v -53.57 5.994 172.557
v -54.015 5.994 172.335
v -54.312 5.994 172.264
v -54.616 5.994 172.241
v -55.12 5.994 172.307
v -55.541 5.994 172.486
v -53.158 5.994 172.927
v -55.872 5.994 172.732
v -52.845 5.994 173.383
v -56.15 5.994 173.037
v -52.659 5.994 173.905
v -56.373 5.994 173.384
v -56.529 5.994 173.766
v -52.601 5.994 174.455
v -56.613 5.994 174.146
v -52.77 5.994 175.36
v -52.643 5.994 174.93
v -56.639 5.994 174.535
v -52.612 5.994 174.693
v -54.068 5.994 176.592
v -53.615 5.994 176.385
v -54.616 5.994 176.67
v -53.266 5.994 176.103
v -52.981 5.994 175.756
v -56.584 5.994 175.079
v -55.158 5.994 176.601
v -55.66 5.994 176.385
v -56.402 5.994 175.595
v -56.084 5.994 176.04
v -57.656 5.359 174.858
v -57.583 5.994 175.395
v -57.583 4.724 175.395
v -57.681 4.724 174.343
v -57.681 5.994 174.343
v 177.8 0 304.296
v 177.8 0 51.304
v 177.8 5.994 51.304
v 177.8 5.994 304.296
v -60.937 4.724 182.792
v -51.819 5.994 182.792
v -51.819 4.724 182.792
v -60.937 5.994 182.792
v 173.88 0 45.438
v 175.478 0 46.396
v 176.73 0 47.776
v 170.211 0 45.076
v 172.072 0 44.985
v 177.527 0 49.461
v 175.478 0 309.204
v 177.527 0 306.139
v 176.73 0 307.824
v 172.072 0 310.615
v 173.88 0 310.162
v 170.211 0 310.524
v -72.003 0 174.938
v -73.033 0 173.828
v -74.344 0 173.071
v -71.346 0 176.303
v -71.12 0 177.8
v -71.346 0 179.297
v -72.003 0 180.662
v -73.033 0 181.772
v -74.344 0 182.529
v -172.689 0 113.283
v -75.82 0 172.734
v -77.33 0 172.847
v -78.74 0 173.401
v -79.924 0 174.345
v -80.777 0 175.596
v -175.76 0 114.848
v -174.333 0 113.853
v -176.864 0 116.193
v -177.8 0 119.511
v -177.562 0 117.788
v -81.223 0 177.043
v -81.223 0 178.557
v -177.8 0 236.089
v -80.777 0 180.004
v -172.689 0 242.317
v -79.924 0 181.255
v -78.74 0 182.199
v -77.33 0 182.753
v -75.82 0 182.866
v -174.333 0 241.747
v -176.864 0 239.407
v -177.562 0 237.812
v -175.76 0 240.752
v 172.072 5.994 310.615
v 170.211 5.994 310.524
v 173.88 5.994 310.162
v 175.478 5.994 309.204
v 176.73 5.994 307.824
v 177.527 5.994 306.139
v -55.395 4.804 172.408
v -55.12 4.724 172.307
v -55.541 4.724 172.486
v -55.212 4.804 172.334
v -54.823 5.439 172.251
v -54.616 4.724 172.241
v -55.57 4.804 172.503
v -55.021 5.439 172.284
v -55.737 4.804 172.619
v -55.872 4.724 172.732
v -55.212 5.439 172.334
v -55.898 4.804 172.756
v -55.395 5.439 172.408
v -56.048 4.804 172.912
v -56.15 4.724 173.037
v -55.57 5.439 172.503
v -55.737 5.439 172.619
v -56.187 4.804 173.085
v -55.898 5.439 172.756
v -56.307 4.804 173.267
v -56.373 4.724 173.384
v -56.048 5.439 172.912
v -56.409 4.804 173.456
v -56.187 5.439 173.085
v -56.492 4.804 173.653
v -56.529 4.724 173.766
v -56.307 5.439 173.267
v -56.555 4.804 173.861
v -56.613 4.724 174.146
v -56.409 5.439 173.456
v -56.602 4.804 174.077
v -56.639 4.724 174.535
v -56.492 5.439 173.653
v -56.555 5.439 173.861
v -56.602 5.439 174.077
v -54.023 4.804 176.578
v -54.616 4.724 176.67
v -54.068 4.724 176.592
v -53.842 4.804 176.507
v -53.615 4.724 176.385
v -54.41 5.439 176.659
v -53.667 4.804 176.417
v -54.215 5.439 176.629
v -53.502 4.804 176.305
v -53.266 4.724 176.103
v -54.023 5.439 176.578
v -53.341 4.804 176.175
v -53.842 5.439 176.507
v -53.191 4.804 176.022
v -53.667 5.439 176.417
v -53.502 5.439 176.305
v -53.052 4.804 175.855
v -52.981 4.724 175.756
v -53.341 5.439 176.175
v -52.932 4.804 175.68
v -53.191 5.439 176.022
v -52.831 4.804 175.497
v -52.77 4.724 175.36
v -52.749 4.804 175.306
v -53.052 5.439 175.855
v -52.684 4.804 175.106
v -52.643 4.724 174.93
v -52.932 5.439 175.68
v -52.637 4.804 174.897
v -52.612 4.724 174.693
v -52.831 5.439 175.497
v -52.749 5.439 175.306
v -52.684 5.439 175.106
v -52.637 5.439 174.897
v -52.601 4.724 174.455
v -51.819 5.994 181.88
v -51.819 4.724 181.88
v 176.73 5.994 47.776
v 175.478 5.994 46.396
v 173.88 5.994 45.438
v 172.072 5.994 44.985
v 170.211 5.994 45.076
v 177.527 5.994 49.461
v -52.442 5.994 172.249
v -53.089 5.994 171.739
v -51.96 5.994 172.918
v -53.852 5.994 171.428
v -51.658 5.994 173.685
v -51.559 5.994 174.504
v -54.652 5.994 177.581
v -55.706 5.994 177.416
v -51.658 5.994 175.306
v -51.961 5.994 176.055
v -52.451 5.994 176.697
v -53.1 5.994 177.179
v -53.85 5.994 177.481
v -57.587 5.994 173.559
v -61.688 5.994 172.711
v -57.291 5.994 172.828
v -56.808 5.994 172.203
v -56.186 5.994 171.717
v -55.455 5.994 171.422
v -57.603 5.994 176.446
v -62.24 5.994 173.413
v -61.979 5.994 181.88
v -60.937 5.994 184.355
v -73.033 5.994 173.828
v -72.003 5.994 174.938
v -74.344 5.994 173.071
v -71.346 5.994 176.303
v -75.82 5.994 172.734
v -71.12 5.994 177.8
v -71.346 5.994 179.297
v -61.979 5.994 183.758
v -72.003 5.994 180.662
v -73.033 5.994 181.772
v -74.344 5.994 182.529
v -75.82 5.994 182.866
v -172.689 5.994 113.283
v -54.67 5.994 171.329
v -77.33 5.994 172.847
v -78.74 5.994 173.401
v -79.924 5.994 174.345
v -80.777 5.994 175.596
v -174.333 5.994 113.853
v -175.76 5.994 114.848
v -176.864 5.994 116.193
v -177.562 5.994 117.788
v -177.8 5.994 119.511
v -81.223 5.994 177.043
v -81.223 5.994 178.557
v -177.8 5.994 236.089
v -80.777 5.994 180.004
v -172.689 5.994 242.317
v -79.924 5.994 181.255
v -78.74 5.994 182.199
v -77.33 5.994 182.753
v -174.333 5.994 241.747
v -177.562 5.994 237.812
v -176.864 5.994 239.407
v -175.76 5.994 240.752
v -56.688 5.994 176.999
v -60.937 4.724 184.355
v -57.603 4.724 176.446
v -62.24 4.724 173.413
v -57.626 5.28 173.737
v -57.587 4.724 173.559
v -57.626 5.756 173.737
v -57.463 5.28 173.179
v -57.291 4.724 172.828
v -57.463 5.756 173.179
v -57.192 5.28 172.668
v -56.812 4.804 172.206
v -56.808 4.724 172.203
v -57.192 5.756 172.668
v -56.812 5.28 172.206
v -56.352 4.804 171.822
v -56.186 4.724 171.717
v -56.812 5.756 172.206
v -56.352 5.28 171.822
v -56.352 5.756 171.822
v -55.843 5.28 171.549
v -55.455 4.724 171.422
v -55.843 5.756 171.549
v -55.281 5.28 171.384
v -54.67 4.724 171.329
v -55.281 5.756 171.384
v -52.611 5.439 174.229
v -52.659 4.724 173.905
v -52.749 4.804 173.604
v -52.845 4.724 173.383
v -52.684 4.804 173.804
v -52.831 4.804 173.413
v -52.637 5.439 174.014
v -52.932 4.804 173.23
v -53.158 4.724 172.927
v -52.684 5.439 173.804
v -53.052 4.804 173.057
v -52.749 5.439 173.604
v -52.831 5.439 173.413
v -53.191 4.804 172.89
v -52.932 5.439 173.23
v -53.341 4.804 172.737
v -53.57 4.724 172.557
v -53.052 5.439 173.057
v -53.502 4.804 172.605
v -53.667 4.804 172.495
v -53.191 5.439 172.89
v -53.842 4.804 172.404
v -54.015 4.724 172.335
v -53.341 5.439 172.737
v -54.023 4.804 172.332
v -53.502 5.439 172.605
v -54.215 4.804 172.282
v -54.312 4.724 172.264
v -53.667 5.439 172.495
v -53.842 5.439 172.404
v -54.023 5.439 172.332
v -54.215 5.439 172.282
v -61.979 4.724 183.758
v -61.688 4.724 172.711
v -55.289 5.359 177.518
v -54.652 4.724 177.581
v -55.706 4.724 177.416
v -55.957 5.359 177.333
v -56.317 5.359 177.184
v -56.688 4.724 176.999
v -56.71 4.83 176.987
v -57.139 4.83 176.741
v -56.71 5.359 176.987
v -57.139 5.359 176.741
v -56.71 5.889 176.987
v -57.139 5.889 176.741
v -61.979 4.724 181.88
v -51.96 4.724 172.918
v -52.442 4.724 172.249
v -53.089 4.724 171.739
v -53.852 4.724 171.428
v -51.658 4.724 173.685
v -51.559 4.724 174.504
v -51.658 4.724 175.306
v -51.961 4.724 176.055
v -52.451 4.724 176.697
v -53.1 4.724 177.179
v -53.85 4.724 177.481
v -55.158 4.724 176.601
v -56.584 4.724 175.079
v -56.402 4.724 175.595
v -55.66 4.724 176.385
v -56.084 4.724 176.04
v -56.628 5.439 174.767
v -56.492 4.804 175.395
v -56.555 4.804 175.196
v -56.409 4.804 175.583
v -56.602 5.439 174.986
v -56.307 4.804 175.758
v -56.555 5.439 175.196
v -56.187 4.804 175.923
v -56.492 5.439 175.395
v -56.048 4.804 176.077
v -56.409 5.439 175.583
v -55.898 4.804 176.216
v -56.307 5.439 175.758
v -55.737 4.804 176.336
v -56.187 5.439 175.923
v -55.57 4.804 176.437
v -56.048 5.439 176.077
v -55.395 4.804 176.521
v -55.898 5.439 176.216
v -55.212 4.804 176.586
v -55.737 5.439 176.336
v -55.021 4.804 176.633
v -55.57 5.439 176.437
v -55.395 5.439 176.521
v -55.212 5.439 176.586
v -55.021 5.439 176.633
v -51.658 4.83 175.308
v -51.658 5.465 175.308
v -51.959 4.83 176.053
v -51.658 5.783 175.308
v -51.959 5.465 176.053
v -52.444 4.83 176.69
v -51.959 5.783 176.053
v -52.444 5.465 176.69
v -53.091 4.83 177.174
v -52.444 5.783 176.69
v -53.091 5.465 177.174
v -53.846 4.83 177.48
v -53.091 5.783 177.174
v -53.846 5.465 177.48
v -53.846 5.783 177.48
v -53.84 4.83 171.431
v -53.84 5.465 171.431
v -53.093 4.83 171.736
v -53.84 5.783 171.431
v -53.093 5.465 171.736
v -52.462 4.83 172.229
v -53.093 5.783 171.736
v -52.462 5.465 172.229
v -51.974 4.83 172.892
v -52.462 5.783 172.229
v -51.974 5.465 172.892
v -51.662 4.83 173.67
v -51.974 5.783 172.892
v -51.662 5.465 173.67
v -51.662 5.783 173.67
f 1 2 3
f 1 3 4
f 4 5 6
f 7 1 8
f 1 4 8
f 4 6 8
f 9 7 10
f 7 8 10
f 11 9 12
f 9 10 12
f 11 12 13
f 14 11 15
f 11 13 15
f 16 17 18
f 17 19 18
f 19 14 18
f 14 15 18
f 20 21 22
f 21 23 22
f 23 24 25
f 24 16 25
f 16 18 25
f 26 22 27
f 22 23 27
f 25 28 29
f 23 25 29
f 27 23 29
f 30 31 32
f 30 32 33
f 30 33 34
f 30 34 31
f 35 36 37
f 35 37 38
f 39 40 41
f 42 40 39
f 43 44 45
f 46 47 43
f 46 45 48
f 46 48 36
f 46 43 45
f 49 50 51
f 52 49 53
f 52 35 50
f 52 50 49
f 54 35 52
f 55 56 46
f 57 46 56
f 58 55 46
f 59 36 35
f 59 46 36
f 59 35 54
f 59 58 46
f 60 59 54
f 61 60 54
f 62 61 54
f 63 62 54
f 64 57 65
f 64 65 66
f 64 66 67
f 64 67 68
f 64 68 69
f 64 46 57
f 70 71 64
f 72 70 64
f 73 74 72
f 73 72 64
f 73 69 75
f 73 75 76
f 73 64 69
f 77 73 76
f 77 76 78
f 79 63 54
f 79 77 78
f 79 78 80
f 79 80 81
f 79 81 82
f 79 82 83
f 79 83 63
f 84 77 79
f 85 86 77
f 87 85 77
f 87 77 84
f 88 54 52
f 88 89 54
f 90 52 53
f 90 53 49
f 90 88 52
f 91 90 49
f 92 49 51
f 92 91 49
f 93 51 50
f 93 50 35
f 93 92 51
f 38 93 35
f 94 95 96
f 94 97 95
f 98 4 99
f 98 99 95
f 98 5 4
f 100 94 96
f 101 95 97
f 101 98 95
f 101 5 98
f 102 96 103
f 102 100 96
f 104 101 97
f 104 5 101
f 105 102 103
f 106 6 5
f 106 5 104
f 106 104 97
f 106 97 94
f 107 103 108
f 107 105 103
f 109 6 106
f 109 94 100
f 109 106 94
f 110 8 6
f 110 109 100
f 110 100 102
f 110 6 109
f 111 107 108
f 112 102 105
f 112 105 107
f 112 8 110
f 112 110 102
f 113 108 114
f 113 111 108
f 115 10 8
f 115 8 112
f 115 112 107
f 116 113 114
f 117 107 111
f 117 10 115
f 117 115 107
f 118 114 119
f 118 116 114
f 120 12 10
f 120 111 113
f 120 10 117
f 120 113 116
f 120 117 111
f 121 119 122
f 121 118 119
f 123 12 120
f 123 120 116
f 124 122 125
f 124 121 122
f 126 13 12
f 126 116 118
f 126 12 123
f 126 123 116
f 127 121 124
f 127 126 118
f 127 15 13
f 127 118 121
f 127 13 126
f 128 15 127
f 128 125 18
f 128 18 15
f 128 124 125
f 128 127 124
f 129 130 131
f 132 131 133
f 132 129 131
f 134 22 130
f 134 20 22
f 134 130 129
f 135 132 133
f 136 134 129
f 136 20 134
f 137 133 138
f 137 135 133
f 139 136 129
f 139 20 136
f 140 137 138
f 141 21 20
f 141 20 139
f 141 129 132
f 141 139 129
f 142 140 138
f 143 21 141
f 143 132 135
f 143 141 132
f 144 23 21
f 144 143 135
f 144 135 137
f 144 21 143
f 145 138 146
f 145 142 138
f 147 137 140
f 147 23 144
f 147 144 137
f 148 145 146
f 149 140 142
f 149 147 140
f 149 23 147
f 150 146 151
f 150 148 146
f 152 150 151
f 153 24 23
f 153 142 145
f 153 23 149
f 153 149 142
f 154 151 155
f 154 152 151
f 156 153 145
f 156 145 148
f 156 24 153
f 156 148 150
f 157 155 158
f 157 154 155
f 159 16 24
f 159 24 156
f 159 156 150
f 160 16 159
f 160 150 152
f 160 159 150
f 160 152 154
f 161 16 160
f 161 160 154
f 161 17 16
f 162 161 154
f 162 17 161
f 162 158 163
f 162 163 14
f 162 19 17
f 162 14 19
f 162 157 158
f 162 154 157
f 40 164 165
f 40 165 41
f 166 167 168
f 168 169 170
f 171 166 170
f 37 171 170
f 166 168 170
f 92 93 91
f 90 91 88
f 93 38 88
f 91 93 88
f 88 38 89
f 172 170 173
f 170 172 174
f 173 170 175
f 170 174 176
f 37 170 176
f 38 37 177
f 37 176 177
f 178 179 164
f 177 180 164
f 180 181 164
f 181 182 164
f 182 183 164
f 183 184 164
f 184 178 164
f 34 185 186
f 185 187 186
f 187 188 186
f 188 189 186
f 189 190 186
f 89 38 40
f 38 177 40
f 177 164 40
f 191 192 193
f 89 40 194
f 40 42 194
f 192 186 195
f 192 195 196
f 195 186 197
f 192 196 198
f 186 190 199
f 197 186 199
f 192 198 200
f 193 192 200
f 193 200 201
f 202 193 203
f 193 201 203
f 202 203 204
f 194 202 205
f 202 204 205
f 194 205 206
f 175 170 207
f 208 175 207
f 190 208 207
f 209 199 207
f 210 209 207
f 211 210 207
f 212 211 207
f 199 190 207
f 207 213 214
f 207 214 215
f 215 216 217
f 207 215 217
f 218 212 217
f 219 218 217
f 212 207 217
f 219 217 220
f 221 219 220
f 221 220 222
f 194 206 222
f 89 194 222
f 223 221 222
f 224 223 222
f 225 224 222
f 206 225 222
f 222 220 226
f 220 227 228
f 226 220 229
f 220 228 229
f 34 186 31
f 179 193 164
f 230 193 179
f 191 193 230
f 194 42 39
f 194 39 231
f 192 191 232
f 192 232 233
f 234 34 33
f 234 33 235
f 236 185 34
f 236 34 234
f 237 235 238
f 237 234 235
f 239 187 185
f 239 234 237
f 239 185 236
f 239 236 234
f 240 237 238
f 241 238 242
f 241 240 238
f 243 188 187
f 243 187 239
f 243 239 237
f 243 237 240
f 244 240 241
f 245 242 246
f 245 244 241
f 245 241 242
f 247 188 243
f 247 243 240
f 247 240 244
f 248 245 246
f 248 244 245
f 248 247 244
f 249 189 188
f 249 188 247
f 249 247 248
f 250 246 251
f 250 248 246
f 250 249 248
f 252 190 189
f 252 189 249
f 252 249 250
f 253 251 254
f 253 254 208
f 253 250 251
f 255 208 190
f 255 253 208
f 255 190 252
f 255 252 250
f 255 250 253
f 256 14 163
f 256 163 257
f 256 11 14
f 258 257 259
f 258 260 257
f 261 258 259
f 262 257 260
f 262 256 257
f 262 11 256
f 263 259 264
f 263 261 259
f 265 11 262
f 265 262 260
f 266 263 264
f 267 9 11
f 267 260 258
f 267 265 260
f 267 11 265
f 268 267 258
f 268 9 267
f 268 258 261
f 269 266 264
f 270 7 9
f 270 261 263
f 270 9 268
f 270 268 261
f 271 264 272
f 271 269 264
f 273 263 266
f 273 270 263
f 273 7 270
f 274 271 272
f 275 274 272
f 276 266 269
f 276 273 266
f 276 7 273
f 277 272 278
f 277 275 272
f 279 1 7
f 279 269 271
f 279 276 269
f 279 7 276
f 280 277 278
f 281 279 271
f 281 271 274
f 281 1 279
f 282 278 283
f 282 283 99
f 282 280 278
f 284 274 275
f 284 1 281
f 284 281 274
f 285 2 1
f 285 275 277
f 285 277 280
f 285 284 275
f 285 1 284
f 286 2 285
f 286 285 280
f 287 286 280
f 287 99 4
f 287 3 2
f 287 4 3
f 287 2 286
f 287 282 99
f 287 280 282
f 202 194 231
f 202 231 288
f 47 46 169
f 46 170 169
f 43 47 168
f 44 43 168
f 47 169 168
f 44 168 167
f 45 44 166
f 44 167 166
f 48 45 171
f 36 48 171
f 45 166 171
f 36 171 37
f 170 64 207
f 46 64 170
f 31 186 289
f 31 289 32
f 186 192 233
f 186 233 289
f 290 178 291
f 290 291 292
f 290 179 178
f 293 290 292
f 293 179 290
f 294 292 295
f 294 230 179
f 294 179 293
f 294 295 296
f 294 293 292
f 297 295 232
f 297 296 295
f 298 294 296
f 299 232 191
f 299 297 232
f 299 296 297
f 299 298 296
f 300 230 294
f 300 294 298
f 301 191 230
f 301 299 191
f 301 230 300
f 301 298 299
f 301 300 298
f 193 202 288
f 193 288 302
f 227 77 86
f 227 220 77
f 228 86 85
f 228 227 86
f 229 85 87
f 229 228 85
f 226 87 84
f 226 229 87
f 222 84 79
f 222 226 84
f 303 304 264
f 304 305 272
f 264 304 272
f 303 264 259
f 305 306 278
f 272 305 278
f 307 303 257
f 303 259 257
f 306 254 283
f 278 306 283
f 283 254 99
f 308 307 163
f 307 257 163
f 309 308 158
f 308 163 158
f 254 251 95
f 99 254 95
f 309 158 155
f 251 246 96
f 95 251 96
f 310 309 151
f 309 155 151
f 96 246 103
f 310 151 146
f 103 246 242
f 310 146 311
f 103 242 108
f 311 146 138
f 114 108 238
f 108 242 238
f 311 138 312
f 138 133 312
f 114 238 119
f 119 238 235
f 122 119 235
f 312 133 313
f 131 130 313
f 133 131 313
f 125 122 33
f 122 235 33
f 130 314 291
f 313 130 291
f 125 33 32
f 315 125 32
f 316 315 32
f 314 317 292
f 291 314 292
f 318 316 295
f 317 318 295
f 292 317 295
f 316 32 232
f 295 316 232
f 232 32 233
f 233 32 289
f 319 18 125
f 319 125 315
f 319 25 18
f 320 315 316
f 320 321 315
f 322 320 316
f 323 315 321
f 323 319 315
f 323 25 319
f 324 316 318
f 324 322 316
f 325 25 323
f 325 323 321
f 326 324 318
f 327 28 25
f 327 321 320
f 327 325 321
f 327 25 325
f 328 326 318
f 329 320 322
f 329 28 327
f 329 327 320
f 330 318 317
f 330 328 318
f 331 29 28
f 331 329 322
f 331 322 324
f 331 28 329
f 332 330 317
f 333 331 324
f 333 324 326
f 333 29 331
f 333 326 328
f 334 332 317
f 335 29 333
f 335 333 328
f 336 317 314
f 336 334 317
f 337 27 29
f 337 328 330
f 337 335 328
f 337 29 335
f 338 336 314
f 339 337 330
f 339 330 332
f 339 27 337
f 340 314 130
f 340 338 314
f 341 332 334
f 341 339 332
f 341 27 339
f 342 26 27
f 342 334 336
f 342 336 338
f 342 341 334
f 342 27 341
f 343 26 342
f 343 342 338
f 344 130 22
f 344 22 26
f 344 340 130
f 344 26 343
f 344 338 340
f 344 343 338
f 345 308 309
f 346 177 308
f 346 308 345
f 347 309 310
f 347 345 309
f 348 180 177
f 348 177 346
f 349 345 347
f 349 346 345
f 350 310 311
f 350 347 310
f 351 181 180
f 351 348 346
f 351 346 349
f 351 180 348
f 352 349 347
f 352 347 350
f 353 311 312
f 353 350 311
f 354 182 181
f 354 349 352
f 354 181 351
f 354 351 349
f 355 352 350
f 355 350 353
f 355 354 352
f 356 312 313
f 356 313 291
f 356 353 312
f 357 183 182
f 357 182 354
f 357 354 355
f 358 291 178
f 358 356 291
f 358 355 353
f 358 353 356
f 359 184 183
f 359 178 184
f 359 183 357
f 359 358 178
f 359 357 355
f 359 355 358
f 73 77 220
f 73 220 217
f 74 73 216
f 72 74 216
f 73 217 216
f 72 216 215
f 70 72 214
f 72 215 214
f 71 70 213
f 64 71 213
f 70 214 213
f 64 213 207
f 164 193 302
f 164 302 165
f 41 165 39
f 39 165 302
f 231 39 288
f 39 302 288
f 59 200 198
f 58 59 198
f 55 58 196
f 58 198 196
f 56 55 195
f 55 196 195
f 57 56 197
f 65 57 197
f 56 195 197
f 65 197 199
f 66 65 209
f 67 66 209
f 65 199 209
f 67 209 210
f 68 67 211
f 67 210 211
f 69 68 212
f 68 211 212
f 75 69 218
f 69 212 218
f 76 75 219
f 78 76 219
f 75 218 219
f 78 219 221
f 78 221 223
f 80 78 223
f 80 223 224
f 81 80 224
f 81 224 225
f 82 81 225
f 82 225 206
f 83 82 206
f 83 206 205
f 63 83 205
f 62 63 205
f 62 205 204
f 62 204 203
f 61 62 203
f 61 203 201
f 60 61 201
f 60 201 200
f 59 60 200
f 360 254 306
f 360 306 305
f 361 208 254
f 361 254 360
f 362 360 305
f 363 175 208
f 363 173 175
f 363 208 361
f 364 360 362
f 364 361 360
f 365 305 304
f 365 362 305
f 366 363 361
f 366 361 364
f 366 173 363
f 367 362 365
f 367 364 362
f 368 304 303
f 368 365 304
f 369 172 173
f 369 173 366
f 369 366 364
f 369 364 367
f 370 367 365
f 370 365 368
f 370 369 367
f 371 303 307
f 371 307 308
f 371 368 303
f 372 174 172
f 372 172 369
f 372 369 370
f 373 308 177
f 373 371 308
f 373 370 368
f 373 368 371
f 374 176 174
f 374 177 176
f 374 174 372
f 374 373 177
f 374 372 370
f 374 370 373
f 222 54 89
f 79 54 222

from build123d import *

# Parameters (mm, degrees)
BOSS_EXTRUDE1_DEPTH   = 5.9944
SKETCH2_R             = 5.08
CUT_EXTRUDE1_DEPTH    = 381.139257342
CUT_EXTRUDE2_DEPTH    = 1.27
FILLET1_R             = 6.35
BODY_MOVE_COPY1_ANGLE = 90


with BuildPart() as part:
    # Sketch1 → Boss-Extrude1 (new body)
    with BuildSketch(Plane(origin=(0, 0, 0), x_dir=(1, 0, 0), z_dir=(0, 1, 0))):
        Polygon((-63.5, 0), (63.5, 0), (134.23323784, -355.6), (-134.23323784, -355.6), align=None)
    extrude(amount=BOSS_EXTRUDE1_DEPTH)

    # Sketch2 → Cut-Extrude1 (cut, through all)
    with BuildSketch(Plane(origin=(0, 5.9944, 0), x_dir=(1, 0, 0), z_dir=(0, 1, 0))):
        with Locations(Location((0, -101.6, 0), (0, 0, 270))):
            Circle(SKETCH2_R)
    extrude(amount=-CUT_EXTRUDE1_DEPTH, mode=Mode.SUBTRACT)

    # Sketch3 → Cut-Extrude2 (cut)
    # profile 1 of 2: a face of its own
    with BuildSketch(Plane(origin=(0, 5.9944, 0), x_dir=(1, 0, 0), z_dir=(0, 1, 0))):
        Polygon((-5.958315024, -115.820937251), (-4.079773357, -115.820937251), (-4.079773357, -125.980937251), (-4.991568229, -125.980937251), (-4.991568229, -116.862988533), (-6.554645152, -116.862988533), align=None)
    # profile 2 of 2: a face of its own
    with BuildSketch(Plane(origin=(0, 5.9944, 0), x_dir=(1, 0, 0), z_dir=(0, 1, 0))):
        with BuildLine():
            Line((4.386893309, -115.56042443), (5.089056771, -116.111978917))
            Line((5.089056771, -116.111978917), (2.404553566, -120.217091097))
            add(Edge.make_bspline(
                [(2.404553566, -120.217091097), (2.583283284, -120.188602861), (2.931915808, -120.133033337), (3.284804245, -120.123866273), (3.45678113, -120.119398789)],
                knots=[0, 0, 0, 0, 1.025318673, 2, 2, 2, 2], degree=3))
            add(Edge.make_bspline(
                [(3.45678113, -120.119398789), (3.560043005, -120.122174245), (3.763310933, -120.127637647), (4.061744393, -120.169682196), (4.348514562, -120.235940235), (4.622432842, -120.332524841), (4.884482412, -120.455903104), (5.136167082, -120.603771368), (5.372755774, -120.783765), (5.597295197, -120.984831271), (5.801154428, -121.207529718), (5.981642635, -121.44382617), (6.133249551, -121.693474441), (6.256254992, -121.956348086), (6.351773154, -122.232041891), (6.42140586, -122.520203119), (6.462567193, -122.821030476), (6.468156617, -123.025618551), (6.470995873, -123.12954302)],
                knots=[0, 0, 0, 0, 1.04369286, 2.054478336, 3.041073146, 4.015093852, 4.984733326, 5.965804835, 6.960378782, 7.985147595, 9.009457201, 10.008161701, 10.986880575, 11.956520048, 12.937015923, 13.931873656, 14.949455224, 16, 16, 16, 16], degree=3))
            add(Edge.make_bspline(
                [(6.470995873, -123.12954302), (6.466864803, -123.271724103), (6.458735835, -123.551502827), (6.377735101, -123.958996352), (6.251868247, -124.34720274), (6.071956336, -124.709923946), (5.848487475, -125.046662834), (5.575974235, -125.345034357), (5.264081137, -125.611139379), (4.911422318, -125.833662594), (4.53189417, -126.015390308), (4.133180944, -126.145917982), (3.719154713, -126.226279139), (3.438144765, -126.236353802), (3.295995873, -126.241450071)],
                knots=[0, 0, 0, 0, 1.031375318, 2.029502543, 3.004789286, 3.987476834, 4.960371455, 5.9300674, 6.912260825, 7.929083631, 8.949397511, 9.960523116, 10.96833055, 12, 12, 12, 12], degree=3))
            add(Edge.make_bspline(
                [(3.295995873, -126.241450071), (3.15928088, -126.237013908), (2.888472414, -126.228226646), (2.490105217, -126.149948381), (2.107325715, -126.023072905), (1.742815741, -125.848279457), (1.405153618, -125.627494288), (1.103065942, -125.361702072), (0.838058963, -125.056584311), (0.617515491, -124.712188331), (0.442593001, -124.342103197), (0.311413104, -123.956205623), (0.234788581, -123.555901676), (0.224081227, -123.284539284), (0.218688181, -123.147860328)],
                knots=[0, 0, 0, 0, 1.012016664, 2.004627821, 2.994792927, 3.992885782, 4.990978636, 5.973936114, 6.964471063, 7.975201453, 8.993600317, 9.990122807, 10.98767138, 12, 12, 12, 12], degree=3))
            add(Edge.make_bspline(
                [(0.218688181, -123.147860328), (0.222117747, -123.043228052), (0.229120266, -122.829588936), (0.278014222, -122.506024787), (0.356579455, -122.174950789), (0.44456577, -121.894087187), (0.537531541, -121.664002312), (0.614900056, -121.478499608), (0.711199427, -121.287604607), (0.813883299, -121.084771424), (0.932194667, -120.875227425), (1.060836667, -120.655470487), (1.203365939, -120.428995588), (1.303282754, -120.275306153), (1.354361258, -120.196738533)],
                knots=[0, 0, 0, 0, 1.173818275, 2.396712641, 3.66331629, 4.989737886, 5.693666774, 6.447286557, 7.243889047, 8.091586357, 8.998013824, 9.943181721, 10.948533338, 12, 12, 12, 12], degree=3))
            Line((1.354361258, -120.196738533), (4.386893309, -115.56042443))
        make_face()
        with BuildLine():
            add(Edge.make_bspline(
                [(3.265467027, -121.161450071), (3.188070339, -121.163708621), (3.036892125, -121.168120225), (2.815092315, -121.19373867), (2.605177277, -121.241981443), (2.40436594, -121.303424281), (2.216412608, -121.387906306), (2.03995129, -121.490527528), (1.874299597, -121.611347862), (1.721192601, -121.74865565), (1.58237895, -121.898988912), (1.46283601, -122.06000901), (1.359719557, -122.227835383), (1.275879763, -122.403870278), (1.210594286, -122.588046402), (1.163369878, -122.77951668), (1.137088131, -122.979565066), (1.132715756, -123.115222846), (1.130483053, -123.184494943)],
                knots=[0, 0, 0, 0, 1.129588631, 2.206414736, 3.251139165, 4.268635594, 5.265702196, 6.250456724, 7.242448911, 8.251968645, 9.246821453, 10.222880186, 11.173611482, 12.116736599, 13.062300278, 14.020270554, 14.989073742, 16, 16, 16, 16], degree=3))
            add(Edge.make_bspline(
                [(1.130483053, -123.184494943), (1.132301291, -123.253147456), (1.135866585, -123.387764814), (1.168240176, -123.586143689), (1.217690586, -123.777049823), (1.291250136, -123.959499036), (1.378994474, -124.136272348), (1.494833929, -124.300966776), (1.623188942, -124.463585037), (1.77661636, -124.611635023), (1.941276179, -124.749394823), (2.117192813, -124.869806073), (2.300537154, -124.972817365), (2.493784482, -125.053549009), (2.694193048, -125.119804653), (2.903432599, -125.166428832), (3.121648659, -125.192788302), (3.269467771, -125.197166373), (3.344842027, -125.199398789)],
                knots=[0, 0, 0, 0, 0.989467248, 1.94019797, 2.891935182, 3.827694429, 4.772920941, 5.730924762, 6.725747692, 7.756678648, 8.79901574, 9.819492441, 10.826891316, 11.826466727, 12.835195252, 13.867842842, 14.912794438, 16, 16, 16, 16], degree=3))
            add(Edge.make_bspline(
                [(3.344842027, -125.199398789), (3.42021616, -125.197166198), (3.568035029, -125.192787784), (3.786252845, -125.166430802), (3.995485908, -125.119797424), (4.195918058, -125.053575211), (4.389078327, -124.972720162), (4.572262318, -124.870446932), (4.746515298, -124.748654316), (4.91128321, -124.611870444), (5.064072014, -124.462742394), (5.195505486, -124.3024184), (5.307797386, -124.134941263), (5.399046341, -123.960195389), (5.471795689, -123.776939505), (5.521496863, -123.586173243), (5.553803599, -123.387757076), (5.557378079, -123.253144843), (5.559201002, -123.184494943)],
                knots=[0, 0, 0, 0, 1.087397944, 2.132534446, 3.165364764, 4.174271784, 5.174024072, 6.181601208, 7.194203697, 8.236725232, 9.267838612, 10.269026844, 11.221737037, 12.171628256, 13.107553087, 14.05945871, 15.010357665, 16, 16, 16, 16], degree=3))
            add(Edge.make_bspline(
                [(5.559201002, -123.184494943), (5.55760358, -123.115132475), (5.55446836, -122.978996509), (5.519007206, -122.779606166), (5.469825915, -122.587073567), (5.395562032, -122.402608755), (5.299081091, -122.226939663), (5.181563543, -122.059178902), (5.045615282, -121.898040294), (4.888577853, -121.748360827), (4.717627917, -121.611499595), (4.535863817, -121.490683969), (4.345703528, -121.388721179), (4.147339855, -121.303646848), (3.938499944, -121.242252946), (3.722555417, -121.19391096), (3.496744358, -121.168185789), (3.343541404, -121.163723908), (3.265467027, -121.161450071)],
                knots=[0, 0, 0, 0, 0.978206639, 1.919901502, 2.851605144, 3.780102724, 4.718870031, 5.675451981, 6.667674623, 7.690630536, 8.733308323, 9.756129687, 10.767539656, 11.776269907, 12.797430371, 13.836405707, 14.897401972, 16, 16, 16, 16], degree=3))
        make_face(mode=Mode.SUBTRACT)
    extrude(amount=-CUT_EXTRUDE2_DEPTH, mode=Mode.SUBTRACT)

    # Fillet1
    fillet1_edges = [part.edges().sort_by_distance(p)[0] for p in [
        (134.23323784, 2.9972, 355.6),
        (-134.23323784, 2.9972, 355.6),
        (-63.5, 2.9972, 0),
        (63.5, 2.9972, 0),
    ]]
    fillet(fillet1_edges, radius=FILLET1_R)


with BuildPart() as part_1:
    # Body-Move/Copy1: moved
    add(part.part.rotate(Axis((0, 0, 177.8), (0, 1, 0)), BODY_MOVE_COPY1_ANGLE))


solid = part_1.part
